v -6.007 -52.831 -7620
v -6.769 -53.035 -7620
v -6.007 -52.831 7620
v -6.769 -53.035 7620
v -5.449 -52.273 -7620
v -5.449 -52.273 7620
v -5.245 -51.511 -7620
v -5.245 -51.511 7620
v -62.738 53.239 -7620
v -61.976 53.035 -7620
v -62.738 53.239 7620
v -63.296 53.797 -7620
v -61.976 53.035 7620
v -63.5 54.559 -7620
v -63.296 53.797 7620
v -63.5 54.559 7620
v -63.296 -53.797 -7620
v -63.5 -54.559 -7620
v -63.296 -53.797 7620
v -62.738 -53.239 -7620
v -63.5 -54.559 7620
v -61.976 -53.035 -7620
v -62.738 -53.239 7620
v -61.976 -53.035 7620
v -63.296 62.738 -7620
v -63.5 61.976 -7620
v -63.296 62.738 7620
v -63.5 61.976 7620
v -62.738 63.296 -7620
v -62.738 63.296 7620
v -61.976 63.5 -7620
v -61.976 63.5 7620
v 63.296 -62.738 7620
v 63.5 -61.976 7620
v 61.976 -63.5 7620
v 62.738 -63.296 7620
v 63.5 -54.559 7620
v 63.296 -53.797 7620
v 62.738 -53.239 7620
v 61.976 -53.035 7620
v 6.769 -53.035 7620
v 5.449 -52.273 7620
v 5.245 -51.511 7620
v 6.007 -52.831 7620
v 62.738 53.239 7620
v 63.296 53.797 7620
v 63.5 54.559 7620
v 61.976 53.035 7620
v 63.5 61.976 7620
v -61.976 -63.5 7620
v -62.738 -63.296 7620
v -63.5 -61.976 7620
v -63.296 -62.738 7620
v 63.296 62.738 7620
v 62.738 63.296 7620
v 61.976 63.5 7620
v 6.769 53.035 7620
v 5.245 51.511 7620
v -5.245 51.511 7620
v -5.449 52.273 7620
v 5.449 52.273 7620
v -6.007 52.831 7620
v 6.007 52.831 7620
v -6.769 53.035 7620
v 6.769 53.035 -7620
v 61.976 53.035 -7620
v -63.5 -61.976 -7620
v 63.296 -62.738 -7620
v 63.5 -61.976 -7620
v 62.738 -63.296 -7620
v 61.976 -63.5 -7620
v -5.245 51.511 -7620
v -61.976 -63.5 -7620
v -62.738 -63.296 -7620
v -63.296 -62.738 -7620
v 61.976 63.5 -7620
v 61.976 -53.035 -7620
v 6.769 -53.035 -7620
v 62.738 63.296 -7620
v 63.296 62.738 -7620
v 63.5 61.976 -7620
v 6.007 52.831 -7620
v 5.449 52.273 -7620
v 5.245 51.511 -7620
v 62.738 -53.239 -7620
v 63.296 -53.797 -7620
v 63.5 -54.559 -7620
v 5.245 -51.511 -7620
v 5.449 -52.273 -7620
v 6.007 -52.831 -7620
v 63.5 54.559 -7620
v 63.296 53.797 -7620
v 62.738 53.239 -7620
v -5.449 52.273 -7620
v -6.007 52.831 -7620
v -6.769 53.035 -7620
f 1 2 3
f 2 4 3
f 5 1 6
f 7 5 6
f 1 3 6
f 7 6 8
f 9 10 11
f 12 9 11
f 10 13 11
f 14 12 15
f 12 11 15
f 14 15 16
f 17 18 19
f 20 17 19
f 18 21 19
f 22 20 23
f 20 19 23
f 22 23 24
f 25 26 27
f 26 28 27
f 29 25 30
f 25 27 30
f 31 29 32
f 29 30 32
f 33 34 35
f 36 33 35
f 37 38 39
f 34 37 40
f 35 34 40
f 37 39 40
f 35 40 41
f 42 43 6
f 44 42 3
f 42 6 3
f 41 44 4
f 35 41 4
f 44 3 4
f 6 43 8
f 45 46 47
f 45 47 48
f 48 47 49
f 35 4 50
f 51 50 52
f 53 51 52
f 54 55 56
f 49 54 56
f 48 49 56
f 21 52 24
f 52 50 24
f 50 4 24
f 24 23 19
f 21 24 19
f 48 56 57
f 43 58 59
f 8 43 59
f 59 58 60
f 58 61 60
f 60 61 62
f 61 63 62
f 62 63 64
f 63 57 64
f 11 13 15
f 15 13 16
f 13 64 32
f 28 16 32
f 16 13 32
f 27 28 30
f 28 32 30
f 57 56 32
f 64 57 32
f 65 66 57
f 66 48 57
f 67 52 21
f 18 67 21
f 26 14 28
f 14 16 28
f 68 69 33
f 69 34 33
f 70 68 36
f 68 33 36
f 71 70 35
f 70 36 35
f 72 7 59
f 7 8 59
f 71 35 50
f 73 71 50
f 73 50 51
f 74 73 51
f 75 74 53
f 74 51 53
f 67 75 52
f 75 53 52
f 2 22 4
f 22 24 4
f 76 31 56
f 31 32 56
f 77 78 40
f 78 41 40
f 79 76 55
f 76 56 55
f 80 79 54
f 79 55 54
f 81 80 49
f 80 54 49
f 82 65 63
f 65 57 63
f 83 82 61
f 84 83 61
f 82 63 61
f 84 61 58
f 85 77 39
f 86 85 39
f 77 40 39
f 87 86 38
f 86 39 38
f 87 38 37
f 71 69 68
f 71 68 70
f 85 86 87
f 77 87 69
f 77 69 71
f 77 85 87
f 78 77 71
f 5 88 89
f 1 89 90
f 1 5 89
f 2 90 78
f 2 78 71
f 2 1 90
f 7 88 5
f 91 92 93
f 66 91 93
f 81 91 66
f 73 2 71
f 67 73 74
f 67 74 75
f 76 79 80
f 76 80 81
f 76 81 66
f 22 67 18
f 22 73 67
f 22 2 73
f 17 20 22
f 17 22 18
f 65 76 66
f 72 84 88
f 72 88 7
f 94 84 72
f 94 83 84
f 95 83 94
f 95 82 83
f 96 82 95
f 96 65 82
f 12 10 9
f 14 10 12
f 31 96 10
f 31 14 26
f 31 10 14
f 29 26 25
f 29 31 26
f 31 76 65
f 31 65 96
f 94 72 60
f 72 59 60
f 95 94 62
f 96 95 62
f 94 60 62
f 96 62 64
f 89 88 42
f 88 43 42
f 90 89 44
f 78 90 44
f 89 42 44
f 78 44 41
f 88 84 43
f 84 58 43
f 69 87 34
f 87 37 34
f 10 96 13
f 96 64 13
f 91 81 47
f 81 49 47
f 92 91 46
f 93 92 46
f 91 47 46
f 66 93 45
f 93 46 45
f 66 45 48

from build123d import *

# Parameters (mm, degrees)
RAIL_DEPTH = 7620


with BuildPart() as part:
    # Rail Cross Section → Rail (new body, symmetric)
    with BuildSketch(Plane.XY):
        with BuildLine():
            Line((-63.5, -61.976), (-63.5, -54.5592))
            ThreePointArc((-63.5, -54.5592), (-63.053630735, -53.481569265), (-61.976, -53.0352))
            Line((-61.976, -53.0352), (-6.7691, -53.0352))
            ThreePointArc((-6.7691, -53.0352), (-5.691469265, -52.588830735), (-5.2451, -51.5112))
            Line((-5.2451, -51.5112), (-5.2451, 51.5112))
            ThreePointArc((-5.2451, 51.5112), (-5.691469265, 52.588830735), (-6.7691, 53.0352))
            Line((-6.7691, 53.0352), (-61.976, 53.0352))
            ThreePointArc((-61.976, 53.0352), (-63.053630735, 53.481569265), (-63.5, 54.5592))
            Line((-63.5, 54.5592), (-63.5, 61.976))
            ThreePointArc((-63.5, 61.976), (-63.053630735, 63.053630735), (-61.976, 63.5))
            Line((-61.976, 63.5), (61.976, 63.5))
            ThreePointArc((61.976, 63.5), (63.053630735, 63.053630735), (63.5, 61.976))
            Line((63.5, 61.976), (63.5, 54.5592))
            ThreePointArc((63.5, 54.5592), (63.053630735, 53.481569265), (61.976, 53.0352))
            Line((61.976, 53.0352), (6.7691, 53.0352))
            ThreePointArc((6.7691, 53.0352), (5.691469265, 52.588830735), (5.2451, 51.5112))
            Line((5.2451, 51.5112), (5.2451, -51.5112))
            ThreePointArc((5.2451, -51.5112), (5.691469265, -52.588830735), (6.7691, -53.0352))
            Line((6.7691, -53.0352), (61.976, -53.0352))
            ThreePointArc((61.976, -53.0352), (63.053630735, -53.481569265), (63.5, -54.5592))
            Line((63.5, -54.5592), (63.5, -61.976))
            ThreePointArc((63.5, -61.976), (63.053630735, -63.053630735), (61.976, -63.5))
            Line((61.976, -63.5), (-61.976, -63.5))
            ThreePointArc((-61.976, -63.5), (-63.053630735, -63.053630735), (-63.5, -61.976))
        make_face()
    extrude(amount=RAIL_DEPTH, both=True)


solid = part.part
